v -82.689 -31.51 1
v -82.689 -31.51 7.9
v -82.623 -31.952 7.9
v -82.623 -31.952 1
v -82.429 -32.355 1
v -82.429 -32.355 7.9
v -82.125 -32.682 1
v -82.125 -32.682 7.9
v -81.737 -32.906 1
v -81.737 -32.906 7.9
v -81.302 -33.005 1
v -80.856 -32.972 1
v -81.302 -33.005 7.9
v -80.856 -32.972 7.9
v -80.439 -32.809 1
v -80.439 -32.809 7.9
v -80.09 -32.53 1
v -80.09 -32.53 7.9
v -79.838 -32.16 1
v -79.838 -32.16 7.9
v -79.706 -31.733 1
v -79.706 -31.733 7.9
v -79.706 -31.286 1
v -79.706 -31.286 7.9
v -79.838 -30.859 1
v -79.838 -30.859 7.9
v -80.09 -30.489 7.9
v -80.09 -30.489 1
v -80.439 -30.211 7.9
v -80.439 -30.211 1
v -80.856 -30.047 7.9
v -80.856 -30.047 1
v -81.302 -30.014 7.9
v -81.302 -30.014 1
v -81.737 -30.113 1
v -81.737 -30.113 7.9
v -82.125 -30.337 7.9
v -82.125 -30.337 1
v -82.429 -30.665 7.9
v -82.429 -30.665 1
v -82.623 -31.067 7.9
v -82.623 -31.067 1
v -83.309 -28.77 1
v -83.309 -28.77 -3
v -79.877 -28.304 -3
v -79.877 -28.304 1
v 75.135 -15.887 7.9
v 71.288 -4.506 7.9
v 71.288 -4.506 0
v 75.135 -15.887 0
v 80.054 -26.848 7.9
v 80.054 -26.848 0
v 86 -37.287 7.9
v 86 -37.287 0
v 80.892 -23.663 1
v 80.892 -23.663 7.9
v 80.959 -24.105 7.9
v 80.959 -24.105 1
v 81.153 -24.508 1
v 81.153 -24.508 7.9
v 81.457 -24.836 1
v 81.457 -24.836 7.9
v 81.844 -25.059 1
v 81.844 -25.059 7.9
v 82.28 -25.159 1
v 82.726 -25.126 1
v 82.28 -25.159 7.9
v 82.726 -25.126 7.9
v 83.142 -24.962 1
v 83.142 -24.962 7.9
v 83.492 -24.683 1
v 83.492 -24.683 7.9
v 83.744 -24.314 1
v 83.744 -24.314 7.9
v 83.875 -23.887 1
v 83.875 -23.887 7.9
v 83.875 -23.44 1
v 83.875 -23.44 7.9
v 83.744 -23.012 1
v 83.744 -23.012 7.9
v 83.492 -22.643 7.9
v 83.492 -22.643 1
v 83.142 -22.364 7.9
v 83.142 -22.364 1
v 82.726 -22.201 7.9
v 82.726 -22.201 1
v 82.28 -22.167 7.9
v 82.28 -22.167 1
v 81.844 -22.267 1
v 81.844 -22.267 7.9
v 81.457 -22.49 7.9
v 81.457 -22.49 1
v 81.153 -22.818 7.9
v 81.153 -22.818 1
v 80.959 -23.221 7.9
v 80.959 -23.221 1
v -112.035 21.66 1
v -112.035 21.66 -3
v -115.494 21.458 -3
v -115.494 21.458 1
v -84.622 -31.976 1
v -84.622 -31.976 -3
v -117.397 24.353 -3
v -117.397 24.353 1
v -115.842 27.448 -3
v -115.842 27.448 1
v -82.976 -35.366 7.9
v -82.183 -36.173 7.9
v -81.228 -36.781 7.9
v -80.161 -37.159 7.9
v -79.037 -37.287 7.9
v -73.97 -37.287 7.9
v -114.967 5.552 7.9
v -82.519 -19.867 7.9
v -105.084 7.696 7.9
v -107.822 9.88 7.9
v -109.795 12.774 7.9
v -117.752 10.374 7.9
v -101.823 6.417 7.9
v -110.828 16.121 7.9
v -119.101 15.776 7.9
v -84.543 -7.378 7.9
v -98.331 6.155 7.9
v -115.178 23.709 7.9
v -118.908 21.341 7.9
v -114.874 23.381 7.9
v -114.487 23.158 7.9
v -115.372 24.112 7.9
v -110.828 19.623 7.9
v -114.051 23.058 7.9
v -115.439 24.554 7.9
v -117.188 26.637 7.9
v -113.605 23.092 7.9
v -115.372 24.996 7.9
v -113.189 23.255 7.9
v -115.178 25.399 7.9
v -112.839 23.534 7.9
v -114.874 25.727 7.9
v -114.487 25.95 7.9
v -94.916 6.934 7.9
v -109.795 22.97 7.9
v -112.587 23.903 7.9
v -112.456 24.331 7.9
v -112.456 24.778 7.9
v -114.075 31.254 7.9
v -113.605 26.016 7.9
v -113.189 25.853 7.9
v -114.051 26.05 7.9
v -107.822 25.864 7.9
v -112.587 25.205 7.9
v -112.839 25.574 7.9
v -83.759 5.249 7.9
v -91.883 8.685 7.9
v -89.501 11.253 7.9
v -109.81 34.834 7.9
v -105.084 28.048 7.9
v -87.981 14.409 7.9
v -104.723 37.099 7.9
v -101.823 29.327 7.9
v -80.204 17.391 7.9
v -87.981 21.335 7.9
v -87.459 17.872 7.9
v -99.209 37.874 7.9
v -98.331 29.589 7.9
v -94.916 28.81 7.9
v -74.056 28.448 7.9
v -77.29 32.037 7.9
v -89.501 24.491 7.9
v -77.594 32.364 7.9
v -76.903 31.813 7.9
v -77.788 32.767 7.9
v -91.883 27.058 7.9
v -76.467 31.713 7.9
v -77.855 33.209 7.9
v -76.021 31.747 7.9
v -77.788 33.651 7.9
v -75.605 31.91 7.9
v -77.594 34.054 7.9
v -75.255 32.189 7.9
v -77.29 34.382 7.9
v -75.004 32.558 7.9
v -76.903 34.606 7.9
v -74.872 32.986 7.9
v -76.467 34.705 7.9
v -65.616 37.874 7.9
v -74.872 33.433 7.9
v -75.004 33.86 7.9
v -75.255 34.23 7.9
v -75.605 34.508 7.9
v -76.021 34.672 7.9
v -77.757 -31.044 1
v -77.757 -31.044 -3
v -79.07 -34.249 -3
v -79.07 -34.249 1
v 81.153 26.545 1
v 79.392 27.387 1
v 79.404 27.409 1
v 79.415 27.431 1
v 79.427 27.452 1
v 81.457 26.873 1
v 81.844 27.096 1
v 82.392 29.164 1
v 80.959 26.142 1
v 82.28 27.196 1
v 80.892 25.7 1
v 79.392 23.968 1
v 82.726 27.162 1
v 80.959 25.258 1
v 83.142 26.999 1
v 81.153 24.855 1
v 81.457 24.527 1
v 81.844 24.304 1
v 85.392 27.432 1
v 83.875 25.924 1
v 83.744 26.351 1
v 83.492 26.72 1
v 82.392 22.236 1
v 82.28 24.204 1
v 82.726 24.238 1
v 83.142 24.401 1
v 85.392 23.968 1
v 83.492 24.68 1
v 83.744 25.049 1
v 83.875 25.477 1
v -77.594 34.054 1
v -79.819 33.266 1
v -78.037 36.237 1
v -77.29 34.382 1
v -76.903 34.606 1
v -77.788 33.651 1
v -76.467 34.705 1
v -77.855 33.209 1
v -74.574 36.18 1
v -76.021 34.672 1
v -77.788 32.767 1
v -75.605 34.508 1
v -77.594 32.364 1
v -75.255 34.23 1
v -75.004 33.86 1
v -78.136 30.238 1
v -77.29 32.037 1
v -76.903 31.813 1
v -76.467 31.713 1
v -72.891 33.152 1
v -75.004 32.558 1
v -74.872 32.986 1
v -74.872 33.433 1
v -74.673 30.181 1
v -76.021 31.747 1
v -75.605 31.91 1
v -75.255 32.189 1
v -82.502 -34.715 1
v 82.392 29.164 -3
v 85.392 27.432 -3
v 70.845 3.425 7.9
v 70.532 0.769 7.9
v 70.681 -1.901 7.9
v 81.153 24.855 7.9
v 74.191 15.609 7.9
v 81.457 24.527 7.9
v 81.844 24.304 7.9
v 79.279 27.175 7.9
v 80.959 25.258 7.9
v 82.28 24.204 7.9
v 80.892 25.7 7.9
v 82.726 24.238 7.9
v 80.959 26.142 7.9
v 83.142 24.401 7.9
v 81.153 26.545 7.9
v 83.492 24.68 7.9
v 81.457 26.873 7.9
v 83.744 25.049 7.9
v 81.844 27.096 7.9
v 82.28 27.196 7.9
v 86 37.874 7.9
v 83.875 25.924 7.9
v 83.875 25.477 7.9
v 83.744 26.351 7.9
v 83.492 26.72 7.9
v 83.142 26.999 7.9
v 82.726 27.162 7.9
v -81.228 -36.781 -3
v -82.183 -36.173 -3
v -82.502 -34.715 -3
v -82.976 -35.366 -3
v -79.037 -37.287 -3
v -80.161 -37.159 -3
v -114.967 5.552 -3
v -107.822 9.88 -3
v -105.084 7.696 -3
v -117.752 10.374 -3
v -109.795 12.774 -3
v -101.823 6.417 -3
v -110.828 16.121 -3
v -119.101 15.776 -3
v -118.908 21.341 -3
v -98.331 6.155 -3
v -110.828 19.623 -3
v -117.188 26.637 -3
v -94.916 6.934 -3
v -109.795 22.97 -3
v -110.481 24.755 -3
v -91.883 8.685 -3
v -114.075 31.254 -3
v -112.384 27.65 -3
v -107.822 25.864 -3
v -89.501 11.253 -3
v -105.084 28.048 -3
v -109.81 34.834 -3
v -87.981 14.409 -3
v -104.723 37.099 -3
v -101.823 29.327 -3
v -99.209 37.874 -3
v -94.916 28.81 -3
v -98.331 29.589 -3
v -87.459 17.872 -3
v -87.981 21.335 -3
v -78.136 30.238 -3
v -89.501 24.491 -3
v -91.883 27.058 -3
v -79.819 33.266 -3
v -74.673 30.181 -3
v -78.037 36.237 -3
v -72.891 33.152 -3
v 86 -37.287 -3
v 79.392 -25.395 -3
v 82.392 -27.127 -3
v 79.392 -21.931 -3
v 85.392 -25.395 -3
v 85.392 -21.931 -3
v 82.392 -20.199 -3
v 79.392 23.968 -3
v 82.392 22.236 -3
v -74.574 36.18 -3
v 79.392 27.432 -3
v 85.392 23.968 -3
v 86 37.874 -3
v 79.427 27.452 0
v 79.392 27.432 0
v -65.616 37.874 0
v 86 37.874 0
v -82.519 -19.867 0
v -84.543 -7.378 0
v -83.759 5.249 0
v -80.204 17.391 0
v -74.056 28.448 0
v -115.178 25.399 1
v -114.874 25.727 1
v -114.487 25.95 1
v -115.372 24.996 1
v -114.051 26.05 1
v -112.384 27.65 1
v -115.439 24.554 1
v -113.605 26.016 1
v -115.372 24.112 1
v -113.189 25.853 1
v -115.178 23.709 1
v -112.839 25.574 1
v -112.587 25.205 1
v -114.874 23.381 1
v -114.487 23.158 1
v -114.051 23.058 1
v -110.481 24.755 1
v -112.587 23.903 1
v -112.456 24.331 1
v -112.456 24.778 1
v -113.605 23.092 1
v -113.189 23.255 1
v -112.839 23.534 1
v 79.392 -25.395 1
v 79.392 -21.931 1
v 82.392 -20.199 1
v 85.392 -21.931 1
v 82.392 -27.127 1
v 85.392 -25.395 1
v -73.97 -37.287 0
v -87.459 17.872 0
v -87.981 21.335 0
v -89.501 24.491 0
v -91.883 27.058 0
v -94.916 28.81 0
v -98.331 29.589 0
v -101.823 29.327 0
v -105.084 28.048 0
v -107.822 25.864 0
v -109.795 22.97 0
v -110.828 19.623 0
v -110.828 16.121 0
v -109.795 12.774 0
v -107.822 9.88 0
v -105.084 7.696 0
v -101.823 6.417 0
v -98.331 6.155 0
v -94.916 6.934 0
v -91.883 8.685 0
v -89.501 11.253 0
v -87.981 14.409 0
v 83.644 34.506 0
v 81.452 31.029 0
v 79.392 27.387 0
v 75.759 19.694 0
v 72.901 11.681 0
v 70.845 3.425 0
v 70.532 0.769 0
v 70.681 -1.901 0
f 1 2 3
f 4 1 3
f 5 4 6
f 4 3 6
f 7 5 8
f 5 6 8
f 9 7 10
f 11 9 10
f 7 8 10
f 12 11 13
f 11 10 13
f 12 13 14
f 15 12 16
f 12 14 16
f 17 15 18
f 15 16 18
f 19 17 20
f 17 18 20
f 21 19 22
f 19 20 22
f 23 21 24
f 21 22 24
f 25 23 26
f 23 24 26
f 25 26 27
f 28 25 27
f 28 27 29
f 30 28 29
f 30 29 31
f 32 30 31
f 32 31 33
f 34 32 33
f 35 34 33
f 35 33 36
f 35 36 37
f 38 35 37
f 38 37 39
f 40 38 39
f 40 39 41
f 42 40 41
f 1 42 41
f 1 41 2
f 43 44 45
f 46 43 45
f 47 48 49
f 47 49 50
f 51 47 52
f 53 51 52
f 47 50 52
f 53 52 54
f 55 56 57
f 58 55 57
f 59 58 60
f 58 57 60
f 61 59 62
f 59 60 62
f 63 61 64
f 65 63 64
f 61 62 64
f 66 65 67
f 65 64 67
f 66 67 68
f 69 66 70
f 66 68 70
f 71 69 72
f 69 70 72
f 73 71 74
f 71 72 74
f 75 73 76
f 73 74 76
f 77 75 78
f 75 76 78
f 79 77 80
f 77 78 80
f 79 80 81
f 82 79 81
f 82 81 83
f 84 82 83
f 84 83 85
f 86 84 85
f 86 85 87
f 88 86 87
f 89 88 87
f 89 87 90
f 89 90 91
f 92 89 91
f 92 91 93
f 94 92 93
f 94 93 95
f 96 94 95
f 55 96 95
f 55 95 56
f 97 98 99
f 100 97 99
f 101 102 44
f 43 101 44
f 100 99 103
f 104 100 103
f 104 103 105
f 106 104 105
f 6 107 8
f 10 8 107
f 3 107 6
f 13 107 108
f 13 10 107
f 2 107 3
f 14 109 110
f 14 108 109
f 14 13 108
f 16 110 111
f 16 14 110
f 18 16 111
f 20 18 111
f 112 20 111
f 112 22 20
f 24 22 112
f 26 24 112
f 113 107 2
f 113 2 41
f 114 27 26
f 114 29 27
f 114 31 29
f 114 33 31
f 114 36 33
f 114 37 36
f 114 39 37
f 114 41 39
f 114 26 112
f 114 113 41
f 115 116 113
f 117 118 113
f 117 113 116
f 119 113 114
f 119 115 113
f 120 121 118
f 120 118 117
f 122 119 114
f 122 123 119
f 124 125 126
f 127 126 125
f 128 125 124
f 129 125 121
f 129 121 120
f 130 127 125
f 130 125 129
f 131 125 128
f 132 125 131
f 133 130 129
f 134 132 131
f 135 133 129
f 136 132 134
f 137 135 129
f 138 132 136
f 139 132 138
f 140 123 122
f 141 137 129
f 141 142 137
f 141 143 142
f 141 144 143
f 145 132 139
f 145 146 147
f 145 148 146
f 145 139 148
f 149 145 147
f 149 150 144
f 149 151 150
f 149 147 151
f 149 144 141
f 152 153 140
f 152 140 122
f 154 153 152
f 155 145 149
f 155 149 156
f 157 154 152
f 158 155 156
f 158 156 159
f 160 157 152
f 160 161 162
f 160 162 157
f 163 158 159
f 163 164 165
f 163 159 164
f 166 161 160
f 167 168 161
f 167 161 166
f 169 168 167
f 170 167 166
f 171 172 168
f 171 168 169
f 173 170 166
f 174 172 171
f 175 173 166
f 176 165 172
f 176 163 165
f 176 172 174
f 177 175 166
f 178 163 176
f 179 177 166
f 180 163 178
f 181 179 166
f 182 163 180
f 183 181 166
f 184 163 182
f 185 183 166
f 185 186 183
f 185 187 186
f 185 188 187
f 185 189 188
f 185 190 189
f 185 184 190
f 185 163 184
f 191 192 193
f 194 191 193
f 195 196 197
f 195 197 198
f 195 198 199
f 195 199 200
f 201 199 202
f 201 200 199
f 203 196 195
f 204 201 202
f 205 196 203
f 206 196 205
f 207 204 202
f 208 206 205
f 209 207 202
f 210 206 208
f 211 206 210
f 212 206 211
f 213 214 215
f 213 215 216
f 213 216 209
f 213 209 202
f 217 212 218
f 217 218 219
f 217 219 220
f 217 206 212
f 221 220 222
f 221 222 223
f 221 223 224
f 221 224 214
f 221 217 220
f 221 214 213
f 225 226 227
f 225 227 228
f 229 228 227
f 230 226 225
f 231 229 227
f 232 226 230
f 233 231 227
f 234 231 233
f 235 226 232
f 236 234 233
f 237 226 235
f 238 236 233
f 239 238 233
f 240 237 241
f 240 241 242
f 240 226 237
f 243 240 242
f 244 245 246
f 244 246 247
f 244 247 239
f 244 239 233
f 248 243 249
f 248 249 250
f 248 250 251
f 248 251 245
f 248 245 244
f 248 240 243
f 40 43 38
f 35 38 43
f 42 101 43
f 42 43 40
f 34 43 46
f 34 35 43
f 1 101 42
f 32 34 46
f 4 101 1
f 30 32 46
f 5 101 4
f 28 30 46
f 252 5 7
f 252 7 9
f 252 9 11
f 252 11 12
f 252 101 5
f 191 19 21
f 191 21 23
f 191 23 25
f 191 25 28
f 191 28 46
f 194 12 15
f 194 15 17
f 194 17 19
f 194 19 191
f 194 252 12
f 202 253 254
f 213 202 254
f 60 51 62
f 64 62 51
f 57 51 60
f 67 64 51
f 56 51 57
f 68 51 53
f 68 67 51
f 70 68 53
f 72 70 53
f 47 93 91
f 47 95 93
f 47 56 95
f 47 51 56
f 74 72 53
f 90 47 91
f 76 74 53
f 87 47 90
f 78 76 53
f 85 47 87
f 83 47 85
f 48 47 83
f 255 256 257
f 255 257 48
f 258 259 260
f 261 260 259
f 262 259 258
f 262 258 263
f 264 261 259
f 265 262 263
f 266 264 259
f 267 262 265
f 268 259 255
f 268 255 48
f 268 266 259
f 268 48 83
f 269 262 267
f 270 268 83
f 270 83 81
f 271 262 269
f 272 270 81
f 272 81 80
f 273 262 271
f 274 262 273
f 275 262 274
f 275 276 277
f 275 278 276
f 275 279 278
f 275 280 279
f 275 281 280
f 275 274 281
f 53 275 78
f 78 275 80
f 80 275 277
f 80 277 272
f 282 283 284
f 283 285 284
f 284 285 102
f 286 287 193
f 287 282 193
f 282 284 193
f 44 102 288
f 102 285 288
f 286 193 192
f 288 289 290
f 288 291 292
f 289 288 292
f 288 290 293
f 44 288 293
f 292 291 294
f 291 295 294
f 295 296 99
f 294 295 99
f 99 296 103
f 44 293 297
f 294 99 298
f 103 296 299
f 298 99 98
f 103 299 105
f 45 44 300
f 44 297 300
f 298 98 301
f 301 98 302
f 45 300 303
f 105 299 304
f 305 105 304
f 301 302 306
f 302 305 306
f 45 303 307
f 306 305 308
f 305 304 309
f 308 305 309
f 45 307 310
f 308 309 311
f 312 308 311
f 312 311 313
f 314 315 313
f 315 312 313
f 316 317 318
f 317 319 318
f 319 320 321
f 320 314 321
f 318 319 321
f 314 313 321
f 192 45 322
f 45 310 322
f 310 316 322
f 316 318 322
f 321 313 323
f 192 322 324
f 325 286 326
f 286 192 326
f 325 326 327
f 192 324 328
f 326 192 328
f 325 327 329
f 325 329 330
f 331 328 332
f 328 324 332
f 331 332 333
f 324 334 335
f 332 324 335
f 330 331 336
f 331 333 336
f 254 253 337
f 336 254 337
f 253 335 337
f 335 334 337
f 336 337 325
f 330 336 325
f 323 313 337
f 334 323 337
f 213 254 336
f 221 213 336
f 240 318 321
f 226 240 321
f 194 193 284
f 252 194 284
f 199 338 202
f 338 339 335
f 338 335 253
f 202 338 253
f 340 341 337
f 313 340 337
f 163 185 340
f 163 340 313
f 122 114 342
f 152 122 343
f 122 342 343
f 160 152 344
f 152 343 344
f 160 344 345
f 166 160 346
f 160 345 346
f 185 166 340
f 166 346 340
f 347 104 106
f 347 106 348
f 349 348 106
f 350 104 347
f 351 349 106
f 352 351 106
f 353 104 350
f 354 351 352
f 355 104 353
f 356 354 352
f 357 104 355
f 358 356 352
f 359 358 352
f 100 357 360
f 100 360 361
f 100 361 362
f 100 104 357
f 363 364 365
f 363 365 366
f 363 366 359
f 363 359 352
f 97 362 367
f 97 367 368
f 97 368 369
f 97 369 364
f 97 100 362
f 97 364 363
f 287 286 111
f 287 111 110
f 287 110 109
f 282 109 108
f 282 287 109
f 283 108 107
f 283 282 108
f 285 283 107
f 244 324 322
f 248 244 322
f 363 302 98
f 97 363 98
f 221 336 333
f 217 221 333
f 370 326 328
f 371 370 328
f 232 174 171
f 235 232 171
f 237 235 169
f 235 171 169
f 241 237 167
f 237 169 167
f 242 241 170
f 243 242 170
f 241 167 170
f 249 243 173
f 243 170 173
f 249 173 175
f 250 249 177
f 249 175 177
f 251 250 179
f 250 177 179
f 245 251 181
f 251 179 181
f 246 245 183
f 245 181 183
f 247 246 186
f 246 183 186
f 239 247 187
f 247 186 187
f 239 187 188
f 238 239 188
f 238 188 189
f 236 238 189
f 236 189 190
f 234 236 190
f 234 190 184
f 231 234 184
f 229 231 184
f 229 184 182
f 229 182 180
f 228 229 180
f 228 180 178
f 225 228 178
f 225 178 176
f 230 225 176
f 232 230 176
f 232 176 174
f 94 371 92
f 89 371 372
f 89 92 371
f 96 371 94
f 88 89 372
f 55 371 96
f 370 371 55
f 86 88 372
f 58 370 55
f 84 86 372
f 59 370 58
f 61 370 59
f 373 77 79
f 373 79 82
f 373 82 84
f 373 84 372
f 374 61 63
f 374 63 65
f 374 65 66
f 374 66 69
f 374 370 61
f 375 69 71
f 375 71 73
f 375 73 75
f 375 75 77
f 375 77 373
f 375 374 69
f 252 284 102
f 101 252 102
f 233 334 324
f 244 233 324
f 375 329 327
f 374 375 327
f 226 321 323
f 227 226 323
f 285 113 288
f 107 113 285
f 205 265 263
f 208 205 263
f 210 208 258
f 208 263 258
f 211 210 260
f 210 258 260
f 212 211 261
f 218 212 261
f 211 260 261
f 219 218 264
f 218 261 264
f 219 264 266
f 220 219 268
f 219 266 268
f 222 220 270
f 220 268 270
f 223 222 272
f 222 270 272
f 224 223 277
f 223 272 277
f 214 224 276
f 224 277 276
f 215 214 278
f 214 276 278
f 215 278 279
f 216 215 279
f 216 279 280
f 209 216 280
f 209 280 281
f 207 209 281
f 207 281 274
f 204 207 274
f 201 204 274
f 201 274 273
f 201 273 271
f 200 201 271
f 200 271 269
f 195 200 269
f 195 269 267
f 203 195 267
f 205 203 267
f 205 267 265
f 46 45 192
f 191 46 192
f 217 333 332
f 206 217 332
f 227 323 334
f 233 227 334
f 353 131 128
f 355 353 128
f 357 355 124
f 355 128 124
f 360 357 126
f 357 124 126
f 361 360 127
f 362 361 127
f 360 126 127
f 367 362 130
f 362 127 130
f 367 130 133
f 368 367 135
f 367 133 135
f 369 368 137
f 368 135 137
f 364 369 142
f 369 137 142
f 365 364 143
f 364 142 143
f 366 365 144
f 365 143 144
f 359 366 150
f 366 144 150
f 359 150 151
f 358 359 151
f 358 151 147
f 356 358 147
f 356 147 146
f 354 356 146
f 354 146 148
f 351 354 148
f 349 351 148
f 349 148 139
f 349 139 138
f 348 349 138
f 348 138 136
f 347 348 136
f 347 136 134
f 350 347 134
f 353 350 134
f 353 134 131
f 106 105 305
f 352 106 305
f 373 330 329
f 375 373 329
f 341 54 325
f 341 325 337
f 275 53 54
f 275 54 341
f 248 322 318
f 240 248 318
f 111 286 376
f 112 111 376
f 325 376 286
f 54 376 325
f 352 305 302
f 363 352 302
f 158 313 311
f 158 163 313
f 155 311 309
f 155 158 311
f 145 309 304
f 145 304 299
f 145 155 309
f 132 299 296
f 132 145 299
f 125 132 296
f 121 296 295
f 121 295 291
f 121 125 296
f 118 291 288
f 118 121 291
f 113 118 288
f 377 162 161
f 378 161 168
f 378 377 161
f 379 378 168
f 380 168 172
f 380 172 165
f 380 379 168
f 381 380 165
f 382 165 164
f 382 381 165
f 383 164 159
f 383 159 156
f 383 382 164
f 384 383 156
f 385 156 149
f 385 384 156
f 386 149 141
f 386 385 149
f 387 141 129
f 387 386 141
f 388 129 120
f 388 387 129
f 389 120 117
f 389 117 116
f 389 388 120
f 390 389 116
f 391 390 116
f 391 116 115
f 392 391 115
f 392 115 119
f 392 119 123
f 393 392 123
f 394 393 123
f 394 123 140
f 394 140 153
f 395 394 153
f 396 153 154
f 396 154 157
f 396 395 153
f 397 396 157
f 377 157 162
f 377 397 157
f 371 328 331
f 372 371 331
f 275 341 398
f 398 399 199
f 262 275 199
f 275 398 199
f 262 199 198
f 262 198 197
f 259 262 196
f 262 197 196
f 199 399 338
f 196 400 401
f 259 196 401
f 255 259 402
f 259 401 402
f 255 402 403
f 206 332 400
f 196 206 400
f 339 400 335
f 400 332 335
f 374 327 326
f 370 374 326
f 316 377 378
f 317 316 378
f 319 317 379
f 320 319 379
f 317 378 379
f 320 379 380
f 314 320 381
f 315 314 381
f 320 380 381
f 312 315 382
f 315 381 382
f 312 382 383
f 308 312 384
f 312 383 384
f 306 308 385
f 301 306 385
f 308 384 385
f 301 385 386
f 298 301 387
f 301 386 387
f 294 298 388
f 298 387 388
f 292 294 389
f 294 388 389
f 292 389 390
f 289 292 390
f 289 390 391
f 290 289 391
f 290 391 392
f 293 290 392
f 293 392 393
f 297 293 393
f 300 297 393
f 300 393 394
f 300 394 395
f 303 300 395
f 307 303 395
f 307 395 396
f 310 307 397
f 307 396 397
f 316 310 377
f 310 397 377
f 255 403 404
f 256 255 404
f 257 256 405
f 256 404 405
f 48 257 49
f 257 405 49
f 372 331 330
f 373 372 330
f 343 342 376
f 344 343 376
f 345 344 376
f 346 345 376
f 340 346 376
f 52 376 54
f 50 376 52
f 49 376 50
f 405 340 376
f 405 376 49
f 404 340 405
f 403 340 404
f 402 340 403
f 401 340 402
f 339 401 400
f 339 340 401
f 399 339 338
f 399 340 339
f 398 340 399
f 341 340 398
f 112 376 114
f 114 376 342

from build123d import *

# Parameters (mm, degrees)
F2_DEPTH  = 3
F0_R      = 11.75
F3_DEPTH  = 7.9
F4_DEPTH  = 7.9
F5_DEPTH  = 3
F6_R      = 5
F6_2_R    = 5
F9_D      = 3
F10_DEPTH = 4
F11_DEPTH = 4


with BuildPart() as f2:
    # F0 (on Top) → F2 (new body)
    with BuildSketch(Plane.XY):
        with BuildLine():
            ThreePointArc((70.8448413014, 3.4252903424), (76.5230858808, 21.4851908555), (86, 37.8739237785))
            Line((86, 37.8739237785), (-65.6162592679, 37.8739237785))
            ThreePointArc((-65.6162592679, 37.8739237785), (-82.3199649398, 11.4193737584), (-82.519158721, -19.8666825891))
            Line((-82.519158721, -19.8666825891), (-73.9695476283, -37.2867286205))
            Line((-73.9695476283, -37.2867286205), (86, -37.2867286205))
            ThreePointArc((86, -37.2867286205), (77.4631412951, -21.4263167299), (71.2877699379, -4.5060504646))
            ThreePointArc((71.2877699379, -4.5060504646), (70.5487291916, -0.5692843065), (70.8448413014, 3.4252903424))
        make_face()
    extrude(amount=-F2_DEPTH)


with BuildPart() as f3:
    # F0 (on Top) → F3 (new body)
    with BuildSketch(Plane.XY):
        with BuildLine():
            ThreePointArc((-82.519158721, -19.8666825891), (-82.3199649398, 11.4193737584), (-65.6162592679, 37.8739237785))
            Line((-65.6162592679, 37.8739237785), (-99.2088739193, 37.8739237785))
            ThreePointArc((-99.2088739193, 37.8739237785), (-117.1879721114, 26.6373104948), (-114.9666717313, 5.5523567478))
            Line((-114.9666717313, 5.5523567478), (-81.4747432756, -37.2867286205))
            Line((-81.4747432756, -37.2867286205), (-73.9695476283, -37.2867286205))
            Line((-73.9695476283, -37.2867286205), (-82.519158721, -19.8666825891))
        make_face()
        with Locations((-99.2088739193, 17.8719250206)):
            Circle(F0_R, mode=Mode.SUBTRACT)
    extrude(amount=F3_DEPTH)


with BuildPart() as f4:
    # F0 (on Top) → F4 (new body)
    with BuildSketch(Plane.XY):
        with BuildLine():
            Line((86, -37.2867286205), (86, 37.8739237785))
            ThreePointArc((86, 37.8739237785), (76.5230858808, 21.4851908555), (70.8448413014, 3.4252903424))
            ThreePointArc((70.8448413014, 3.4252903424), (70.5487291916, -0.5692843065), (71.2877699379, -4.5060504646))
            ThreePointArc((71.2877699379, -4.5060504646), (77.4631412951, -21.4263167299), (86, -37.2867286205))
        make_face()
    extrude(amount=F4_DEPTH)


with BuildPart() as f5:
    # F5 (new): a face of the model
    f5_faces = [f3.part.faces().sort_by_distance(p)[0] for p in [
        (-83.2059045041, 11.6787223922, 0),
    ]]
    extrude(f5_faces, amount=F5_DEPTH)

    # F6#2
    f6_2_edges = [f5.edges().sort_by_distance(p)[0] for p in [
        (-81.474743, -37.286729, -1.5),
    ]]
    fillet(f6_2_edges, radius=F6_2_R)


with BuildPart() as f5b:
    # F5#2 (new): a face of the model
    f5_2_faces = [f4.part.faces().sort_by_distance(p)[0] for p in [
        (80.189714527, 0.7740894227, 0),
    ]]
    extrude(f5_2_faces, amount=F5_DEPTH)


with BuildPart() as f3_1:
    add(f3.part)

    # F6
    f6_edges = [f3_1.edges().sort_by_distance(p)[0] for p in [
        (-81.474743, -37.286729, 3.95),
    ]]
    fillet(f6_edges, radius=F6_R)


with BuildPart() as f2_1:
    add(f2.part)

    # F7: union F3, F4, F5, F5b
    add(f3_1.part)
    add(f4.part)
    add(f5.part)
    add(f5b.part)

    # F9 (through all)
    with Locations(Plane(origin=(0, 0, -3), x_dir=(1, 0, 0), z_dir=(0, 0, -1))):
        with Locations((-81.1894536018, 31.5095931292), (-113.9387488365, -24.5540793985), (-76.3550326228, -33.2092493773), (82.3921039701, 23.663148284), (82.3921039701, -25.700064376)):
            Hole(F9_D / 2)

    # F8 (on face) → F10 (cut)
    with BuildSketch(Plane(origin=(0, 0, -3), x_dir=(1, 0, 0), z_dir=(0, 0, -1))):
        Polygon((-74.5737203647, -36.1802637897), (-72.8914025376, -33.1520949158), (-74.6727147957, -30.1810805034), (-78.136344881, -30.2382349648), (-79.8186627081, -33.2664038387), (-78.0373504499, -36.2374182511), align=None)
        Polygon((85.3921039701, 21.9310974764), (85.3921039701, 25.3951990915), (82.3921039701, 27.1272498991), (79.3921039701, 25.3951990915), (79.3921039701, 21.9310974764), (82.3921039701, 20.1990466688), align=None)
        Polygon((85.3921039701, -27.4321151836), (85.3921039701, -23.9680135684), (82.3921039701, -22.2359627609), (79.3921039701, -23.9680135684), (79.3921039701, -27.4321151836), (82.3921039701, -29.1641659911), align=None)
        Polygon((-79.8767595984, 28.3038429122), (-77.7568454741, 31.043544375), (-79.0695394775, 34.249294592), (-82.5021476052, 34.7153433461), (-84.6220617296, 31.9756418833), (-83.3093677262, 28.7698916664), align=None)
        Polygon((-110.4805015339, -24.7553890954), (-112.0352858737, -21.6598042304), (-115.4935331763, -21.4584945334), (-117.3969961391, -24.3527697016), (-115.8422117994, -27.4483545667), (-112.3839644968, -27.6496642636), align=None)
    extrude(amount=-F10_DEPTH, mode=Mode.SUBTRACT)

    # F8 (on face) → F11 (cut)
    with BuildSketch(Plane(origin=(0, 0, -3), x_dir=(1, 0, 0), z_dir=(0, 0, -1))):
        Polygon((-74.5737203647, -36.1802637897), (-72.8914025376, -33.1520949158), (-74.6727147957, -30.1810805034), (-78.136344881, -30.2382349648), (-79.8186627081, -33.2664038387), (-78.0373504499, -36.2374182511), align=None)
        Polygon((85.3921039701, 21.9310974764), (85.3921039701, 25.3951990915), (82.3921039701, 27.1272498991), (79.3921039701, 25.3951990915), (79.3921039701, 21.9310974764), (82.3921039701, 20.1990466688), align=None)
        Polygon((85.3921039701, -27.4321151836), (85.3921039701, -23.9680135684), (82.3921039701, -22.2359627609), (79.3921039701, -23.9680135684), (79.3921039701, -27.4321151836), (82.3921039701, -29.1641659911), align=None)
        Polygon((-79.8767595984, 28.3038429122), (-77.7568454741, 31.043544375), (-79.0695394775, 34.249294592), (-82.5021476052, 34.7153433461), (-84.6220617296, 31.9756418833), (-83.3093677262, 28.7698916664), align=None)
        Polygon((-110.4805015339, -24.7553890954), (-112.0352858737, -21.6598042304), (-115.4935331763, -21.4584945334), (-117.3969961391, -24.3527697016), (-115.8422117994, -27.4483545667), (-112.3839644968, -27.6496642636), align=None)
    extrude(amount=-F11_DEPTH, mode=Mode.SUBTRACT)


solid = f2_1.part
